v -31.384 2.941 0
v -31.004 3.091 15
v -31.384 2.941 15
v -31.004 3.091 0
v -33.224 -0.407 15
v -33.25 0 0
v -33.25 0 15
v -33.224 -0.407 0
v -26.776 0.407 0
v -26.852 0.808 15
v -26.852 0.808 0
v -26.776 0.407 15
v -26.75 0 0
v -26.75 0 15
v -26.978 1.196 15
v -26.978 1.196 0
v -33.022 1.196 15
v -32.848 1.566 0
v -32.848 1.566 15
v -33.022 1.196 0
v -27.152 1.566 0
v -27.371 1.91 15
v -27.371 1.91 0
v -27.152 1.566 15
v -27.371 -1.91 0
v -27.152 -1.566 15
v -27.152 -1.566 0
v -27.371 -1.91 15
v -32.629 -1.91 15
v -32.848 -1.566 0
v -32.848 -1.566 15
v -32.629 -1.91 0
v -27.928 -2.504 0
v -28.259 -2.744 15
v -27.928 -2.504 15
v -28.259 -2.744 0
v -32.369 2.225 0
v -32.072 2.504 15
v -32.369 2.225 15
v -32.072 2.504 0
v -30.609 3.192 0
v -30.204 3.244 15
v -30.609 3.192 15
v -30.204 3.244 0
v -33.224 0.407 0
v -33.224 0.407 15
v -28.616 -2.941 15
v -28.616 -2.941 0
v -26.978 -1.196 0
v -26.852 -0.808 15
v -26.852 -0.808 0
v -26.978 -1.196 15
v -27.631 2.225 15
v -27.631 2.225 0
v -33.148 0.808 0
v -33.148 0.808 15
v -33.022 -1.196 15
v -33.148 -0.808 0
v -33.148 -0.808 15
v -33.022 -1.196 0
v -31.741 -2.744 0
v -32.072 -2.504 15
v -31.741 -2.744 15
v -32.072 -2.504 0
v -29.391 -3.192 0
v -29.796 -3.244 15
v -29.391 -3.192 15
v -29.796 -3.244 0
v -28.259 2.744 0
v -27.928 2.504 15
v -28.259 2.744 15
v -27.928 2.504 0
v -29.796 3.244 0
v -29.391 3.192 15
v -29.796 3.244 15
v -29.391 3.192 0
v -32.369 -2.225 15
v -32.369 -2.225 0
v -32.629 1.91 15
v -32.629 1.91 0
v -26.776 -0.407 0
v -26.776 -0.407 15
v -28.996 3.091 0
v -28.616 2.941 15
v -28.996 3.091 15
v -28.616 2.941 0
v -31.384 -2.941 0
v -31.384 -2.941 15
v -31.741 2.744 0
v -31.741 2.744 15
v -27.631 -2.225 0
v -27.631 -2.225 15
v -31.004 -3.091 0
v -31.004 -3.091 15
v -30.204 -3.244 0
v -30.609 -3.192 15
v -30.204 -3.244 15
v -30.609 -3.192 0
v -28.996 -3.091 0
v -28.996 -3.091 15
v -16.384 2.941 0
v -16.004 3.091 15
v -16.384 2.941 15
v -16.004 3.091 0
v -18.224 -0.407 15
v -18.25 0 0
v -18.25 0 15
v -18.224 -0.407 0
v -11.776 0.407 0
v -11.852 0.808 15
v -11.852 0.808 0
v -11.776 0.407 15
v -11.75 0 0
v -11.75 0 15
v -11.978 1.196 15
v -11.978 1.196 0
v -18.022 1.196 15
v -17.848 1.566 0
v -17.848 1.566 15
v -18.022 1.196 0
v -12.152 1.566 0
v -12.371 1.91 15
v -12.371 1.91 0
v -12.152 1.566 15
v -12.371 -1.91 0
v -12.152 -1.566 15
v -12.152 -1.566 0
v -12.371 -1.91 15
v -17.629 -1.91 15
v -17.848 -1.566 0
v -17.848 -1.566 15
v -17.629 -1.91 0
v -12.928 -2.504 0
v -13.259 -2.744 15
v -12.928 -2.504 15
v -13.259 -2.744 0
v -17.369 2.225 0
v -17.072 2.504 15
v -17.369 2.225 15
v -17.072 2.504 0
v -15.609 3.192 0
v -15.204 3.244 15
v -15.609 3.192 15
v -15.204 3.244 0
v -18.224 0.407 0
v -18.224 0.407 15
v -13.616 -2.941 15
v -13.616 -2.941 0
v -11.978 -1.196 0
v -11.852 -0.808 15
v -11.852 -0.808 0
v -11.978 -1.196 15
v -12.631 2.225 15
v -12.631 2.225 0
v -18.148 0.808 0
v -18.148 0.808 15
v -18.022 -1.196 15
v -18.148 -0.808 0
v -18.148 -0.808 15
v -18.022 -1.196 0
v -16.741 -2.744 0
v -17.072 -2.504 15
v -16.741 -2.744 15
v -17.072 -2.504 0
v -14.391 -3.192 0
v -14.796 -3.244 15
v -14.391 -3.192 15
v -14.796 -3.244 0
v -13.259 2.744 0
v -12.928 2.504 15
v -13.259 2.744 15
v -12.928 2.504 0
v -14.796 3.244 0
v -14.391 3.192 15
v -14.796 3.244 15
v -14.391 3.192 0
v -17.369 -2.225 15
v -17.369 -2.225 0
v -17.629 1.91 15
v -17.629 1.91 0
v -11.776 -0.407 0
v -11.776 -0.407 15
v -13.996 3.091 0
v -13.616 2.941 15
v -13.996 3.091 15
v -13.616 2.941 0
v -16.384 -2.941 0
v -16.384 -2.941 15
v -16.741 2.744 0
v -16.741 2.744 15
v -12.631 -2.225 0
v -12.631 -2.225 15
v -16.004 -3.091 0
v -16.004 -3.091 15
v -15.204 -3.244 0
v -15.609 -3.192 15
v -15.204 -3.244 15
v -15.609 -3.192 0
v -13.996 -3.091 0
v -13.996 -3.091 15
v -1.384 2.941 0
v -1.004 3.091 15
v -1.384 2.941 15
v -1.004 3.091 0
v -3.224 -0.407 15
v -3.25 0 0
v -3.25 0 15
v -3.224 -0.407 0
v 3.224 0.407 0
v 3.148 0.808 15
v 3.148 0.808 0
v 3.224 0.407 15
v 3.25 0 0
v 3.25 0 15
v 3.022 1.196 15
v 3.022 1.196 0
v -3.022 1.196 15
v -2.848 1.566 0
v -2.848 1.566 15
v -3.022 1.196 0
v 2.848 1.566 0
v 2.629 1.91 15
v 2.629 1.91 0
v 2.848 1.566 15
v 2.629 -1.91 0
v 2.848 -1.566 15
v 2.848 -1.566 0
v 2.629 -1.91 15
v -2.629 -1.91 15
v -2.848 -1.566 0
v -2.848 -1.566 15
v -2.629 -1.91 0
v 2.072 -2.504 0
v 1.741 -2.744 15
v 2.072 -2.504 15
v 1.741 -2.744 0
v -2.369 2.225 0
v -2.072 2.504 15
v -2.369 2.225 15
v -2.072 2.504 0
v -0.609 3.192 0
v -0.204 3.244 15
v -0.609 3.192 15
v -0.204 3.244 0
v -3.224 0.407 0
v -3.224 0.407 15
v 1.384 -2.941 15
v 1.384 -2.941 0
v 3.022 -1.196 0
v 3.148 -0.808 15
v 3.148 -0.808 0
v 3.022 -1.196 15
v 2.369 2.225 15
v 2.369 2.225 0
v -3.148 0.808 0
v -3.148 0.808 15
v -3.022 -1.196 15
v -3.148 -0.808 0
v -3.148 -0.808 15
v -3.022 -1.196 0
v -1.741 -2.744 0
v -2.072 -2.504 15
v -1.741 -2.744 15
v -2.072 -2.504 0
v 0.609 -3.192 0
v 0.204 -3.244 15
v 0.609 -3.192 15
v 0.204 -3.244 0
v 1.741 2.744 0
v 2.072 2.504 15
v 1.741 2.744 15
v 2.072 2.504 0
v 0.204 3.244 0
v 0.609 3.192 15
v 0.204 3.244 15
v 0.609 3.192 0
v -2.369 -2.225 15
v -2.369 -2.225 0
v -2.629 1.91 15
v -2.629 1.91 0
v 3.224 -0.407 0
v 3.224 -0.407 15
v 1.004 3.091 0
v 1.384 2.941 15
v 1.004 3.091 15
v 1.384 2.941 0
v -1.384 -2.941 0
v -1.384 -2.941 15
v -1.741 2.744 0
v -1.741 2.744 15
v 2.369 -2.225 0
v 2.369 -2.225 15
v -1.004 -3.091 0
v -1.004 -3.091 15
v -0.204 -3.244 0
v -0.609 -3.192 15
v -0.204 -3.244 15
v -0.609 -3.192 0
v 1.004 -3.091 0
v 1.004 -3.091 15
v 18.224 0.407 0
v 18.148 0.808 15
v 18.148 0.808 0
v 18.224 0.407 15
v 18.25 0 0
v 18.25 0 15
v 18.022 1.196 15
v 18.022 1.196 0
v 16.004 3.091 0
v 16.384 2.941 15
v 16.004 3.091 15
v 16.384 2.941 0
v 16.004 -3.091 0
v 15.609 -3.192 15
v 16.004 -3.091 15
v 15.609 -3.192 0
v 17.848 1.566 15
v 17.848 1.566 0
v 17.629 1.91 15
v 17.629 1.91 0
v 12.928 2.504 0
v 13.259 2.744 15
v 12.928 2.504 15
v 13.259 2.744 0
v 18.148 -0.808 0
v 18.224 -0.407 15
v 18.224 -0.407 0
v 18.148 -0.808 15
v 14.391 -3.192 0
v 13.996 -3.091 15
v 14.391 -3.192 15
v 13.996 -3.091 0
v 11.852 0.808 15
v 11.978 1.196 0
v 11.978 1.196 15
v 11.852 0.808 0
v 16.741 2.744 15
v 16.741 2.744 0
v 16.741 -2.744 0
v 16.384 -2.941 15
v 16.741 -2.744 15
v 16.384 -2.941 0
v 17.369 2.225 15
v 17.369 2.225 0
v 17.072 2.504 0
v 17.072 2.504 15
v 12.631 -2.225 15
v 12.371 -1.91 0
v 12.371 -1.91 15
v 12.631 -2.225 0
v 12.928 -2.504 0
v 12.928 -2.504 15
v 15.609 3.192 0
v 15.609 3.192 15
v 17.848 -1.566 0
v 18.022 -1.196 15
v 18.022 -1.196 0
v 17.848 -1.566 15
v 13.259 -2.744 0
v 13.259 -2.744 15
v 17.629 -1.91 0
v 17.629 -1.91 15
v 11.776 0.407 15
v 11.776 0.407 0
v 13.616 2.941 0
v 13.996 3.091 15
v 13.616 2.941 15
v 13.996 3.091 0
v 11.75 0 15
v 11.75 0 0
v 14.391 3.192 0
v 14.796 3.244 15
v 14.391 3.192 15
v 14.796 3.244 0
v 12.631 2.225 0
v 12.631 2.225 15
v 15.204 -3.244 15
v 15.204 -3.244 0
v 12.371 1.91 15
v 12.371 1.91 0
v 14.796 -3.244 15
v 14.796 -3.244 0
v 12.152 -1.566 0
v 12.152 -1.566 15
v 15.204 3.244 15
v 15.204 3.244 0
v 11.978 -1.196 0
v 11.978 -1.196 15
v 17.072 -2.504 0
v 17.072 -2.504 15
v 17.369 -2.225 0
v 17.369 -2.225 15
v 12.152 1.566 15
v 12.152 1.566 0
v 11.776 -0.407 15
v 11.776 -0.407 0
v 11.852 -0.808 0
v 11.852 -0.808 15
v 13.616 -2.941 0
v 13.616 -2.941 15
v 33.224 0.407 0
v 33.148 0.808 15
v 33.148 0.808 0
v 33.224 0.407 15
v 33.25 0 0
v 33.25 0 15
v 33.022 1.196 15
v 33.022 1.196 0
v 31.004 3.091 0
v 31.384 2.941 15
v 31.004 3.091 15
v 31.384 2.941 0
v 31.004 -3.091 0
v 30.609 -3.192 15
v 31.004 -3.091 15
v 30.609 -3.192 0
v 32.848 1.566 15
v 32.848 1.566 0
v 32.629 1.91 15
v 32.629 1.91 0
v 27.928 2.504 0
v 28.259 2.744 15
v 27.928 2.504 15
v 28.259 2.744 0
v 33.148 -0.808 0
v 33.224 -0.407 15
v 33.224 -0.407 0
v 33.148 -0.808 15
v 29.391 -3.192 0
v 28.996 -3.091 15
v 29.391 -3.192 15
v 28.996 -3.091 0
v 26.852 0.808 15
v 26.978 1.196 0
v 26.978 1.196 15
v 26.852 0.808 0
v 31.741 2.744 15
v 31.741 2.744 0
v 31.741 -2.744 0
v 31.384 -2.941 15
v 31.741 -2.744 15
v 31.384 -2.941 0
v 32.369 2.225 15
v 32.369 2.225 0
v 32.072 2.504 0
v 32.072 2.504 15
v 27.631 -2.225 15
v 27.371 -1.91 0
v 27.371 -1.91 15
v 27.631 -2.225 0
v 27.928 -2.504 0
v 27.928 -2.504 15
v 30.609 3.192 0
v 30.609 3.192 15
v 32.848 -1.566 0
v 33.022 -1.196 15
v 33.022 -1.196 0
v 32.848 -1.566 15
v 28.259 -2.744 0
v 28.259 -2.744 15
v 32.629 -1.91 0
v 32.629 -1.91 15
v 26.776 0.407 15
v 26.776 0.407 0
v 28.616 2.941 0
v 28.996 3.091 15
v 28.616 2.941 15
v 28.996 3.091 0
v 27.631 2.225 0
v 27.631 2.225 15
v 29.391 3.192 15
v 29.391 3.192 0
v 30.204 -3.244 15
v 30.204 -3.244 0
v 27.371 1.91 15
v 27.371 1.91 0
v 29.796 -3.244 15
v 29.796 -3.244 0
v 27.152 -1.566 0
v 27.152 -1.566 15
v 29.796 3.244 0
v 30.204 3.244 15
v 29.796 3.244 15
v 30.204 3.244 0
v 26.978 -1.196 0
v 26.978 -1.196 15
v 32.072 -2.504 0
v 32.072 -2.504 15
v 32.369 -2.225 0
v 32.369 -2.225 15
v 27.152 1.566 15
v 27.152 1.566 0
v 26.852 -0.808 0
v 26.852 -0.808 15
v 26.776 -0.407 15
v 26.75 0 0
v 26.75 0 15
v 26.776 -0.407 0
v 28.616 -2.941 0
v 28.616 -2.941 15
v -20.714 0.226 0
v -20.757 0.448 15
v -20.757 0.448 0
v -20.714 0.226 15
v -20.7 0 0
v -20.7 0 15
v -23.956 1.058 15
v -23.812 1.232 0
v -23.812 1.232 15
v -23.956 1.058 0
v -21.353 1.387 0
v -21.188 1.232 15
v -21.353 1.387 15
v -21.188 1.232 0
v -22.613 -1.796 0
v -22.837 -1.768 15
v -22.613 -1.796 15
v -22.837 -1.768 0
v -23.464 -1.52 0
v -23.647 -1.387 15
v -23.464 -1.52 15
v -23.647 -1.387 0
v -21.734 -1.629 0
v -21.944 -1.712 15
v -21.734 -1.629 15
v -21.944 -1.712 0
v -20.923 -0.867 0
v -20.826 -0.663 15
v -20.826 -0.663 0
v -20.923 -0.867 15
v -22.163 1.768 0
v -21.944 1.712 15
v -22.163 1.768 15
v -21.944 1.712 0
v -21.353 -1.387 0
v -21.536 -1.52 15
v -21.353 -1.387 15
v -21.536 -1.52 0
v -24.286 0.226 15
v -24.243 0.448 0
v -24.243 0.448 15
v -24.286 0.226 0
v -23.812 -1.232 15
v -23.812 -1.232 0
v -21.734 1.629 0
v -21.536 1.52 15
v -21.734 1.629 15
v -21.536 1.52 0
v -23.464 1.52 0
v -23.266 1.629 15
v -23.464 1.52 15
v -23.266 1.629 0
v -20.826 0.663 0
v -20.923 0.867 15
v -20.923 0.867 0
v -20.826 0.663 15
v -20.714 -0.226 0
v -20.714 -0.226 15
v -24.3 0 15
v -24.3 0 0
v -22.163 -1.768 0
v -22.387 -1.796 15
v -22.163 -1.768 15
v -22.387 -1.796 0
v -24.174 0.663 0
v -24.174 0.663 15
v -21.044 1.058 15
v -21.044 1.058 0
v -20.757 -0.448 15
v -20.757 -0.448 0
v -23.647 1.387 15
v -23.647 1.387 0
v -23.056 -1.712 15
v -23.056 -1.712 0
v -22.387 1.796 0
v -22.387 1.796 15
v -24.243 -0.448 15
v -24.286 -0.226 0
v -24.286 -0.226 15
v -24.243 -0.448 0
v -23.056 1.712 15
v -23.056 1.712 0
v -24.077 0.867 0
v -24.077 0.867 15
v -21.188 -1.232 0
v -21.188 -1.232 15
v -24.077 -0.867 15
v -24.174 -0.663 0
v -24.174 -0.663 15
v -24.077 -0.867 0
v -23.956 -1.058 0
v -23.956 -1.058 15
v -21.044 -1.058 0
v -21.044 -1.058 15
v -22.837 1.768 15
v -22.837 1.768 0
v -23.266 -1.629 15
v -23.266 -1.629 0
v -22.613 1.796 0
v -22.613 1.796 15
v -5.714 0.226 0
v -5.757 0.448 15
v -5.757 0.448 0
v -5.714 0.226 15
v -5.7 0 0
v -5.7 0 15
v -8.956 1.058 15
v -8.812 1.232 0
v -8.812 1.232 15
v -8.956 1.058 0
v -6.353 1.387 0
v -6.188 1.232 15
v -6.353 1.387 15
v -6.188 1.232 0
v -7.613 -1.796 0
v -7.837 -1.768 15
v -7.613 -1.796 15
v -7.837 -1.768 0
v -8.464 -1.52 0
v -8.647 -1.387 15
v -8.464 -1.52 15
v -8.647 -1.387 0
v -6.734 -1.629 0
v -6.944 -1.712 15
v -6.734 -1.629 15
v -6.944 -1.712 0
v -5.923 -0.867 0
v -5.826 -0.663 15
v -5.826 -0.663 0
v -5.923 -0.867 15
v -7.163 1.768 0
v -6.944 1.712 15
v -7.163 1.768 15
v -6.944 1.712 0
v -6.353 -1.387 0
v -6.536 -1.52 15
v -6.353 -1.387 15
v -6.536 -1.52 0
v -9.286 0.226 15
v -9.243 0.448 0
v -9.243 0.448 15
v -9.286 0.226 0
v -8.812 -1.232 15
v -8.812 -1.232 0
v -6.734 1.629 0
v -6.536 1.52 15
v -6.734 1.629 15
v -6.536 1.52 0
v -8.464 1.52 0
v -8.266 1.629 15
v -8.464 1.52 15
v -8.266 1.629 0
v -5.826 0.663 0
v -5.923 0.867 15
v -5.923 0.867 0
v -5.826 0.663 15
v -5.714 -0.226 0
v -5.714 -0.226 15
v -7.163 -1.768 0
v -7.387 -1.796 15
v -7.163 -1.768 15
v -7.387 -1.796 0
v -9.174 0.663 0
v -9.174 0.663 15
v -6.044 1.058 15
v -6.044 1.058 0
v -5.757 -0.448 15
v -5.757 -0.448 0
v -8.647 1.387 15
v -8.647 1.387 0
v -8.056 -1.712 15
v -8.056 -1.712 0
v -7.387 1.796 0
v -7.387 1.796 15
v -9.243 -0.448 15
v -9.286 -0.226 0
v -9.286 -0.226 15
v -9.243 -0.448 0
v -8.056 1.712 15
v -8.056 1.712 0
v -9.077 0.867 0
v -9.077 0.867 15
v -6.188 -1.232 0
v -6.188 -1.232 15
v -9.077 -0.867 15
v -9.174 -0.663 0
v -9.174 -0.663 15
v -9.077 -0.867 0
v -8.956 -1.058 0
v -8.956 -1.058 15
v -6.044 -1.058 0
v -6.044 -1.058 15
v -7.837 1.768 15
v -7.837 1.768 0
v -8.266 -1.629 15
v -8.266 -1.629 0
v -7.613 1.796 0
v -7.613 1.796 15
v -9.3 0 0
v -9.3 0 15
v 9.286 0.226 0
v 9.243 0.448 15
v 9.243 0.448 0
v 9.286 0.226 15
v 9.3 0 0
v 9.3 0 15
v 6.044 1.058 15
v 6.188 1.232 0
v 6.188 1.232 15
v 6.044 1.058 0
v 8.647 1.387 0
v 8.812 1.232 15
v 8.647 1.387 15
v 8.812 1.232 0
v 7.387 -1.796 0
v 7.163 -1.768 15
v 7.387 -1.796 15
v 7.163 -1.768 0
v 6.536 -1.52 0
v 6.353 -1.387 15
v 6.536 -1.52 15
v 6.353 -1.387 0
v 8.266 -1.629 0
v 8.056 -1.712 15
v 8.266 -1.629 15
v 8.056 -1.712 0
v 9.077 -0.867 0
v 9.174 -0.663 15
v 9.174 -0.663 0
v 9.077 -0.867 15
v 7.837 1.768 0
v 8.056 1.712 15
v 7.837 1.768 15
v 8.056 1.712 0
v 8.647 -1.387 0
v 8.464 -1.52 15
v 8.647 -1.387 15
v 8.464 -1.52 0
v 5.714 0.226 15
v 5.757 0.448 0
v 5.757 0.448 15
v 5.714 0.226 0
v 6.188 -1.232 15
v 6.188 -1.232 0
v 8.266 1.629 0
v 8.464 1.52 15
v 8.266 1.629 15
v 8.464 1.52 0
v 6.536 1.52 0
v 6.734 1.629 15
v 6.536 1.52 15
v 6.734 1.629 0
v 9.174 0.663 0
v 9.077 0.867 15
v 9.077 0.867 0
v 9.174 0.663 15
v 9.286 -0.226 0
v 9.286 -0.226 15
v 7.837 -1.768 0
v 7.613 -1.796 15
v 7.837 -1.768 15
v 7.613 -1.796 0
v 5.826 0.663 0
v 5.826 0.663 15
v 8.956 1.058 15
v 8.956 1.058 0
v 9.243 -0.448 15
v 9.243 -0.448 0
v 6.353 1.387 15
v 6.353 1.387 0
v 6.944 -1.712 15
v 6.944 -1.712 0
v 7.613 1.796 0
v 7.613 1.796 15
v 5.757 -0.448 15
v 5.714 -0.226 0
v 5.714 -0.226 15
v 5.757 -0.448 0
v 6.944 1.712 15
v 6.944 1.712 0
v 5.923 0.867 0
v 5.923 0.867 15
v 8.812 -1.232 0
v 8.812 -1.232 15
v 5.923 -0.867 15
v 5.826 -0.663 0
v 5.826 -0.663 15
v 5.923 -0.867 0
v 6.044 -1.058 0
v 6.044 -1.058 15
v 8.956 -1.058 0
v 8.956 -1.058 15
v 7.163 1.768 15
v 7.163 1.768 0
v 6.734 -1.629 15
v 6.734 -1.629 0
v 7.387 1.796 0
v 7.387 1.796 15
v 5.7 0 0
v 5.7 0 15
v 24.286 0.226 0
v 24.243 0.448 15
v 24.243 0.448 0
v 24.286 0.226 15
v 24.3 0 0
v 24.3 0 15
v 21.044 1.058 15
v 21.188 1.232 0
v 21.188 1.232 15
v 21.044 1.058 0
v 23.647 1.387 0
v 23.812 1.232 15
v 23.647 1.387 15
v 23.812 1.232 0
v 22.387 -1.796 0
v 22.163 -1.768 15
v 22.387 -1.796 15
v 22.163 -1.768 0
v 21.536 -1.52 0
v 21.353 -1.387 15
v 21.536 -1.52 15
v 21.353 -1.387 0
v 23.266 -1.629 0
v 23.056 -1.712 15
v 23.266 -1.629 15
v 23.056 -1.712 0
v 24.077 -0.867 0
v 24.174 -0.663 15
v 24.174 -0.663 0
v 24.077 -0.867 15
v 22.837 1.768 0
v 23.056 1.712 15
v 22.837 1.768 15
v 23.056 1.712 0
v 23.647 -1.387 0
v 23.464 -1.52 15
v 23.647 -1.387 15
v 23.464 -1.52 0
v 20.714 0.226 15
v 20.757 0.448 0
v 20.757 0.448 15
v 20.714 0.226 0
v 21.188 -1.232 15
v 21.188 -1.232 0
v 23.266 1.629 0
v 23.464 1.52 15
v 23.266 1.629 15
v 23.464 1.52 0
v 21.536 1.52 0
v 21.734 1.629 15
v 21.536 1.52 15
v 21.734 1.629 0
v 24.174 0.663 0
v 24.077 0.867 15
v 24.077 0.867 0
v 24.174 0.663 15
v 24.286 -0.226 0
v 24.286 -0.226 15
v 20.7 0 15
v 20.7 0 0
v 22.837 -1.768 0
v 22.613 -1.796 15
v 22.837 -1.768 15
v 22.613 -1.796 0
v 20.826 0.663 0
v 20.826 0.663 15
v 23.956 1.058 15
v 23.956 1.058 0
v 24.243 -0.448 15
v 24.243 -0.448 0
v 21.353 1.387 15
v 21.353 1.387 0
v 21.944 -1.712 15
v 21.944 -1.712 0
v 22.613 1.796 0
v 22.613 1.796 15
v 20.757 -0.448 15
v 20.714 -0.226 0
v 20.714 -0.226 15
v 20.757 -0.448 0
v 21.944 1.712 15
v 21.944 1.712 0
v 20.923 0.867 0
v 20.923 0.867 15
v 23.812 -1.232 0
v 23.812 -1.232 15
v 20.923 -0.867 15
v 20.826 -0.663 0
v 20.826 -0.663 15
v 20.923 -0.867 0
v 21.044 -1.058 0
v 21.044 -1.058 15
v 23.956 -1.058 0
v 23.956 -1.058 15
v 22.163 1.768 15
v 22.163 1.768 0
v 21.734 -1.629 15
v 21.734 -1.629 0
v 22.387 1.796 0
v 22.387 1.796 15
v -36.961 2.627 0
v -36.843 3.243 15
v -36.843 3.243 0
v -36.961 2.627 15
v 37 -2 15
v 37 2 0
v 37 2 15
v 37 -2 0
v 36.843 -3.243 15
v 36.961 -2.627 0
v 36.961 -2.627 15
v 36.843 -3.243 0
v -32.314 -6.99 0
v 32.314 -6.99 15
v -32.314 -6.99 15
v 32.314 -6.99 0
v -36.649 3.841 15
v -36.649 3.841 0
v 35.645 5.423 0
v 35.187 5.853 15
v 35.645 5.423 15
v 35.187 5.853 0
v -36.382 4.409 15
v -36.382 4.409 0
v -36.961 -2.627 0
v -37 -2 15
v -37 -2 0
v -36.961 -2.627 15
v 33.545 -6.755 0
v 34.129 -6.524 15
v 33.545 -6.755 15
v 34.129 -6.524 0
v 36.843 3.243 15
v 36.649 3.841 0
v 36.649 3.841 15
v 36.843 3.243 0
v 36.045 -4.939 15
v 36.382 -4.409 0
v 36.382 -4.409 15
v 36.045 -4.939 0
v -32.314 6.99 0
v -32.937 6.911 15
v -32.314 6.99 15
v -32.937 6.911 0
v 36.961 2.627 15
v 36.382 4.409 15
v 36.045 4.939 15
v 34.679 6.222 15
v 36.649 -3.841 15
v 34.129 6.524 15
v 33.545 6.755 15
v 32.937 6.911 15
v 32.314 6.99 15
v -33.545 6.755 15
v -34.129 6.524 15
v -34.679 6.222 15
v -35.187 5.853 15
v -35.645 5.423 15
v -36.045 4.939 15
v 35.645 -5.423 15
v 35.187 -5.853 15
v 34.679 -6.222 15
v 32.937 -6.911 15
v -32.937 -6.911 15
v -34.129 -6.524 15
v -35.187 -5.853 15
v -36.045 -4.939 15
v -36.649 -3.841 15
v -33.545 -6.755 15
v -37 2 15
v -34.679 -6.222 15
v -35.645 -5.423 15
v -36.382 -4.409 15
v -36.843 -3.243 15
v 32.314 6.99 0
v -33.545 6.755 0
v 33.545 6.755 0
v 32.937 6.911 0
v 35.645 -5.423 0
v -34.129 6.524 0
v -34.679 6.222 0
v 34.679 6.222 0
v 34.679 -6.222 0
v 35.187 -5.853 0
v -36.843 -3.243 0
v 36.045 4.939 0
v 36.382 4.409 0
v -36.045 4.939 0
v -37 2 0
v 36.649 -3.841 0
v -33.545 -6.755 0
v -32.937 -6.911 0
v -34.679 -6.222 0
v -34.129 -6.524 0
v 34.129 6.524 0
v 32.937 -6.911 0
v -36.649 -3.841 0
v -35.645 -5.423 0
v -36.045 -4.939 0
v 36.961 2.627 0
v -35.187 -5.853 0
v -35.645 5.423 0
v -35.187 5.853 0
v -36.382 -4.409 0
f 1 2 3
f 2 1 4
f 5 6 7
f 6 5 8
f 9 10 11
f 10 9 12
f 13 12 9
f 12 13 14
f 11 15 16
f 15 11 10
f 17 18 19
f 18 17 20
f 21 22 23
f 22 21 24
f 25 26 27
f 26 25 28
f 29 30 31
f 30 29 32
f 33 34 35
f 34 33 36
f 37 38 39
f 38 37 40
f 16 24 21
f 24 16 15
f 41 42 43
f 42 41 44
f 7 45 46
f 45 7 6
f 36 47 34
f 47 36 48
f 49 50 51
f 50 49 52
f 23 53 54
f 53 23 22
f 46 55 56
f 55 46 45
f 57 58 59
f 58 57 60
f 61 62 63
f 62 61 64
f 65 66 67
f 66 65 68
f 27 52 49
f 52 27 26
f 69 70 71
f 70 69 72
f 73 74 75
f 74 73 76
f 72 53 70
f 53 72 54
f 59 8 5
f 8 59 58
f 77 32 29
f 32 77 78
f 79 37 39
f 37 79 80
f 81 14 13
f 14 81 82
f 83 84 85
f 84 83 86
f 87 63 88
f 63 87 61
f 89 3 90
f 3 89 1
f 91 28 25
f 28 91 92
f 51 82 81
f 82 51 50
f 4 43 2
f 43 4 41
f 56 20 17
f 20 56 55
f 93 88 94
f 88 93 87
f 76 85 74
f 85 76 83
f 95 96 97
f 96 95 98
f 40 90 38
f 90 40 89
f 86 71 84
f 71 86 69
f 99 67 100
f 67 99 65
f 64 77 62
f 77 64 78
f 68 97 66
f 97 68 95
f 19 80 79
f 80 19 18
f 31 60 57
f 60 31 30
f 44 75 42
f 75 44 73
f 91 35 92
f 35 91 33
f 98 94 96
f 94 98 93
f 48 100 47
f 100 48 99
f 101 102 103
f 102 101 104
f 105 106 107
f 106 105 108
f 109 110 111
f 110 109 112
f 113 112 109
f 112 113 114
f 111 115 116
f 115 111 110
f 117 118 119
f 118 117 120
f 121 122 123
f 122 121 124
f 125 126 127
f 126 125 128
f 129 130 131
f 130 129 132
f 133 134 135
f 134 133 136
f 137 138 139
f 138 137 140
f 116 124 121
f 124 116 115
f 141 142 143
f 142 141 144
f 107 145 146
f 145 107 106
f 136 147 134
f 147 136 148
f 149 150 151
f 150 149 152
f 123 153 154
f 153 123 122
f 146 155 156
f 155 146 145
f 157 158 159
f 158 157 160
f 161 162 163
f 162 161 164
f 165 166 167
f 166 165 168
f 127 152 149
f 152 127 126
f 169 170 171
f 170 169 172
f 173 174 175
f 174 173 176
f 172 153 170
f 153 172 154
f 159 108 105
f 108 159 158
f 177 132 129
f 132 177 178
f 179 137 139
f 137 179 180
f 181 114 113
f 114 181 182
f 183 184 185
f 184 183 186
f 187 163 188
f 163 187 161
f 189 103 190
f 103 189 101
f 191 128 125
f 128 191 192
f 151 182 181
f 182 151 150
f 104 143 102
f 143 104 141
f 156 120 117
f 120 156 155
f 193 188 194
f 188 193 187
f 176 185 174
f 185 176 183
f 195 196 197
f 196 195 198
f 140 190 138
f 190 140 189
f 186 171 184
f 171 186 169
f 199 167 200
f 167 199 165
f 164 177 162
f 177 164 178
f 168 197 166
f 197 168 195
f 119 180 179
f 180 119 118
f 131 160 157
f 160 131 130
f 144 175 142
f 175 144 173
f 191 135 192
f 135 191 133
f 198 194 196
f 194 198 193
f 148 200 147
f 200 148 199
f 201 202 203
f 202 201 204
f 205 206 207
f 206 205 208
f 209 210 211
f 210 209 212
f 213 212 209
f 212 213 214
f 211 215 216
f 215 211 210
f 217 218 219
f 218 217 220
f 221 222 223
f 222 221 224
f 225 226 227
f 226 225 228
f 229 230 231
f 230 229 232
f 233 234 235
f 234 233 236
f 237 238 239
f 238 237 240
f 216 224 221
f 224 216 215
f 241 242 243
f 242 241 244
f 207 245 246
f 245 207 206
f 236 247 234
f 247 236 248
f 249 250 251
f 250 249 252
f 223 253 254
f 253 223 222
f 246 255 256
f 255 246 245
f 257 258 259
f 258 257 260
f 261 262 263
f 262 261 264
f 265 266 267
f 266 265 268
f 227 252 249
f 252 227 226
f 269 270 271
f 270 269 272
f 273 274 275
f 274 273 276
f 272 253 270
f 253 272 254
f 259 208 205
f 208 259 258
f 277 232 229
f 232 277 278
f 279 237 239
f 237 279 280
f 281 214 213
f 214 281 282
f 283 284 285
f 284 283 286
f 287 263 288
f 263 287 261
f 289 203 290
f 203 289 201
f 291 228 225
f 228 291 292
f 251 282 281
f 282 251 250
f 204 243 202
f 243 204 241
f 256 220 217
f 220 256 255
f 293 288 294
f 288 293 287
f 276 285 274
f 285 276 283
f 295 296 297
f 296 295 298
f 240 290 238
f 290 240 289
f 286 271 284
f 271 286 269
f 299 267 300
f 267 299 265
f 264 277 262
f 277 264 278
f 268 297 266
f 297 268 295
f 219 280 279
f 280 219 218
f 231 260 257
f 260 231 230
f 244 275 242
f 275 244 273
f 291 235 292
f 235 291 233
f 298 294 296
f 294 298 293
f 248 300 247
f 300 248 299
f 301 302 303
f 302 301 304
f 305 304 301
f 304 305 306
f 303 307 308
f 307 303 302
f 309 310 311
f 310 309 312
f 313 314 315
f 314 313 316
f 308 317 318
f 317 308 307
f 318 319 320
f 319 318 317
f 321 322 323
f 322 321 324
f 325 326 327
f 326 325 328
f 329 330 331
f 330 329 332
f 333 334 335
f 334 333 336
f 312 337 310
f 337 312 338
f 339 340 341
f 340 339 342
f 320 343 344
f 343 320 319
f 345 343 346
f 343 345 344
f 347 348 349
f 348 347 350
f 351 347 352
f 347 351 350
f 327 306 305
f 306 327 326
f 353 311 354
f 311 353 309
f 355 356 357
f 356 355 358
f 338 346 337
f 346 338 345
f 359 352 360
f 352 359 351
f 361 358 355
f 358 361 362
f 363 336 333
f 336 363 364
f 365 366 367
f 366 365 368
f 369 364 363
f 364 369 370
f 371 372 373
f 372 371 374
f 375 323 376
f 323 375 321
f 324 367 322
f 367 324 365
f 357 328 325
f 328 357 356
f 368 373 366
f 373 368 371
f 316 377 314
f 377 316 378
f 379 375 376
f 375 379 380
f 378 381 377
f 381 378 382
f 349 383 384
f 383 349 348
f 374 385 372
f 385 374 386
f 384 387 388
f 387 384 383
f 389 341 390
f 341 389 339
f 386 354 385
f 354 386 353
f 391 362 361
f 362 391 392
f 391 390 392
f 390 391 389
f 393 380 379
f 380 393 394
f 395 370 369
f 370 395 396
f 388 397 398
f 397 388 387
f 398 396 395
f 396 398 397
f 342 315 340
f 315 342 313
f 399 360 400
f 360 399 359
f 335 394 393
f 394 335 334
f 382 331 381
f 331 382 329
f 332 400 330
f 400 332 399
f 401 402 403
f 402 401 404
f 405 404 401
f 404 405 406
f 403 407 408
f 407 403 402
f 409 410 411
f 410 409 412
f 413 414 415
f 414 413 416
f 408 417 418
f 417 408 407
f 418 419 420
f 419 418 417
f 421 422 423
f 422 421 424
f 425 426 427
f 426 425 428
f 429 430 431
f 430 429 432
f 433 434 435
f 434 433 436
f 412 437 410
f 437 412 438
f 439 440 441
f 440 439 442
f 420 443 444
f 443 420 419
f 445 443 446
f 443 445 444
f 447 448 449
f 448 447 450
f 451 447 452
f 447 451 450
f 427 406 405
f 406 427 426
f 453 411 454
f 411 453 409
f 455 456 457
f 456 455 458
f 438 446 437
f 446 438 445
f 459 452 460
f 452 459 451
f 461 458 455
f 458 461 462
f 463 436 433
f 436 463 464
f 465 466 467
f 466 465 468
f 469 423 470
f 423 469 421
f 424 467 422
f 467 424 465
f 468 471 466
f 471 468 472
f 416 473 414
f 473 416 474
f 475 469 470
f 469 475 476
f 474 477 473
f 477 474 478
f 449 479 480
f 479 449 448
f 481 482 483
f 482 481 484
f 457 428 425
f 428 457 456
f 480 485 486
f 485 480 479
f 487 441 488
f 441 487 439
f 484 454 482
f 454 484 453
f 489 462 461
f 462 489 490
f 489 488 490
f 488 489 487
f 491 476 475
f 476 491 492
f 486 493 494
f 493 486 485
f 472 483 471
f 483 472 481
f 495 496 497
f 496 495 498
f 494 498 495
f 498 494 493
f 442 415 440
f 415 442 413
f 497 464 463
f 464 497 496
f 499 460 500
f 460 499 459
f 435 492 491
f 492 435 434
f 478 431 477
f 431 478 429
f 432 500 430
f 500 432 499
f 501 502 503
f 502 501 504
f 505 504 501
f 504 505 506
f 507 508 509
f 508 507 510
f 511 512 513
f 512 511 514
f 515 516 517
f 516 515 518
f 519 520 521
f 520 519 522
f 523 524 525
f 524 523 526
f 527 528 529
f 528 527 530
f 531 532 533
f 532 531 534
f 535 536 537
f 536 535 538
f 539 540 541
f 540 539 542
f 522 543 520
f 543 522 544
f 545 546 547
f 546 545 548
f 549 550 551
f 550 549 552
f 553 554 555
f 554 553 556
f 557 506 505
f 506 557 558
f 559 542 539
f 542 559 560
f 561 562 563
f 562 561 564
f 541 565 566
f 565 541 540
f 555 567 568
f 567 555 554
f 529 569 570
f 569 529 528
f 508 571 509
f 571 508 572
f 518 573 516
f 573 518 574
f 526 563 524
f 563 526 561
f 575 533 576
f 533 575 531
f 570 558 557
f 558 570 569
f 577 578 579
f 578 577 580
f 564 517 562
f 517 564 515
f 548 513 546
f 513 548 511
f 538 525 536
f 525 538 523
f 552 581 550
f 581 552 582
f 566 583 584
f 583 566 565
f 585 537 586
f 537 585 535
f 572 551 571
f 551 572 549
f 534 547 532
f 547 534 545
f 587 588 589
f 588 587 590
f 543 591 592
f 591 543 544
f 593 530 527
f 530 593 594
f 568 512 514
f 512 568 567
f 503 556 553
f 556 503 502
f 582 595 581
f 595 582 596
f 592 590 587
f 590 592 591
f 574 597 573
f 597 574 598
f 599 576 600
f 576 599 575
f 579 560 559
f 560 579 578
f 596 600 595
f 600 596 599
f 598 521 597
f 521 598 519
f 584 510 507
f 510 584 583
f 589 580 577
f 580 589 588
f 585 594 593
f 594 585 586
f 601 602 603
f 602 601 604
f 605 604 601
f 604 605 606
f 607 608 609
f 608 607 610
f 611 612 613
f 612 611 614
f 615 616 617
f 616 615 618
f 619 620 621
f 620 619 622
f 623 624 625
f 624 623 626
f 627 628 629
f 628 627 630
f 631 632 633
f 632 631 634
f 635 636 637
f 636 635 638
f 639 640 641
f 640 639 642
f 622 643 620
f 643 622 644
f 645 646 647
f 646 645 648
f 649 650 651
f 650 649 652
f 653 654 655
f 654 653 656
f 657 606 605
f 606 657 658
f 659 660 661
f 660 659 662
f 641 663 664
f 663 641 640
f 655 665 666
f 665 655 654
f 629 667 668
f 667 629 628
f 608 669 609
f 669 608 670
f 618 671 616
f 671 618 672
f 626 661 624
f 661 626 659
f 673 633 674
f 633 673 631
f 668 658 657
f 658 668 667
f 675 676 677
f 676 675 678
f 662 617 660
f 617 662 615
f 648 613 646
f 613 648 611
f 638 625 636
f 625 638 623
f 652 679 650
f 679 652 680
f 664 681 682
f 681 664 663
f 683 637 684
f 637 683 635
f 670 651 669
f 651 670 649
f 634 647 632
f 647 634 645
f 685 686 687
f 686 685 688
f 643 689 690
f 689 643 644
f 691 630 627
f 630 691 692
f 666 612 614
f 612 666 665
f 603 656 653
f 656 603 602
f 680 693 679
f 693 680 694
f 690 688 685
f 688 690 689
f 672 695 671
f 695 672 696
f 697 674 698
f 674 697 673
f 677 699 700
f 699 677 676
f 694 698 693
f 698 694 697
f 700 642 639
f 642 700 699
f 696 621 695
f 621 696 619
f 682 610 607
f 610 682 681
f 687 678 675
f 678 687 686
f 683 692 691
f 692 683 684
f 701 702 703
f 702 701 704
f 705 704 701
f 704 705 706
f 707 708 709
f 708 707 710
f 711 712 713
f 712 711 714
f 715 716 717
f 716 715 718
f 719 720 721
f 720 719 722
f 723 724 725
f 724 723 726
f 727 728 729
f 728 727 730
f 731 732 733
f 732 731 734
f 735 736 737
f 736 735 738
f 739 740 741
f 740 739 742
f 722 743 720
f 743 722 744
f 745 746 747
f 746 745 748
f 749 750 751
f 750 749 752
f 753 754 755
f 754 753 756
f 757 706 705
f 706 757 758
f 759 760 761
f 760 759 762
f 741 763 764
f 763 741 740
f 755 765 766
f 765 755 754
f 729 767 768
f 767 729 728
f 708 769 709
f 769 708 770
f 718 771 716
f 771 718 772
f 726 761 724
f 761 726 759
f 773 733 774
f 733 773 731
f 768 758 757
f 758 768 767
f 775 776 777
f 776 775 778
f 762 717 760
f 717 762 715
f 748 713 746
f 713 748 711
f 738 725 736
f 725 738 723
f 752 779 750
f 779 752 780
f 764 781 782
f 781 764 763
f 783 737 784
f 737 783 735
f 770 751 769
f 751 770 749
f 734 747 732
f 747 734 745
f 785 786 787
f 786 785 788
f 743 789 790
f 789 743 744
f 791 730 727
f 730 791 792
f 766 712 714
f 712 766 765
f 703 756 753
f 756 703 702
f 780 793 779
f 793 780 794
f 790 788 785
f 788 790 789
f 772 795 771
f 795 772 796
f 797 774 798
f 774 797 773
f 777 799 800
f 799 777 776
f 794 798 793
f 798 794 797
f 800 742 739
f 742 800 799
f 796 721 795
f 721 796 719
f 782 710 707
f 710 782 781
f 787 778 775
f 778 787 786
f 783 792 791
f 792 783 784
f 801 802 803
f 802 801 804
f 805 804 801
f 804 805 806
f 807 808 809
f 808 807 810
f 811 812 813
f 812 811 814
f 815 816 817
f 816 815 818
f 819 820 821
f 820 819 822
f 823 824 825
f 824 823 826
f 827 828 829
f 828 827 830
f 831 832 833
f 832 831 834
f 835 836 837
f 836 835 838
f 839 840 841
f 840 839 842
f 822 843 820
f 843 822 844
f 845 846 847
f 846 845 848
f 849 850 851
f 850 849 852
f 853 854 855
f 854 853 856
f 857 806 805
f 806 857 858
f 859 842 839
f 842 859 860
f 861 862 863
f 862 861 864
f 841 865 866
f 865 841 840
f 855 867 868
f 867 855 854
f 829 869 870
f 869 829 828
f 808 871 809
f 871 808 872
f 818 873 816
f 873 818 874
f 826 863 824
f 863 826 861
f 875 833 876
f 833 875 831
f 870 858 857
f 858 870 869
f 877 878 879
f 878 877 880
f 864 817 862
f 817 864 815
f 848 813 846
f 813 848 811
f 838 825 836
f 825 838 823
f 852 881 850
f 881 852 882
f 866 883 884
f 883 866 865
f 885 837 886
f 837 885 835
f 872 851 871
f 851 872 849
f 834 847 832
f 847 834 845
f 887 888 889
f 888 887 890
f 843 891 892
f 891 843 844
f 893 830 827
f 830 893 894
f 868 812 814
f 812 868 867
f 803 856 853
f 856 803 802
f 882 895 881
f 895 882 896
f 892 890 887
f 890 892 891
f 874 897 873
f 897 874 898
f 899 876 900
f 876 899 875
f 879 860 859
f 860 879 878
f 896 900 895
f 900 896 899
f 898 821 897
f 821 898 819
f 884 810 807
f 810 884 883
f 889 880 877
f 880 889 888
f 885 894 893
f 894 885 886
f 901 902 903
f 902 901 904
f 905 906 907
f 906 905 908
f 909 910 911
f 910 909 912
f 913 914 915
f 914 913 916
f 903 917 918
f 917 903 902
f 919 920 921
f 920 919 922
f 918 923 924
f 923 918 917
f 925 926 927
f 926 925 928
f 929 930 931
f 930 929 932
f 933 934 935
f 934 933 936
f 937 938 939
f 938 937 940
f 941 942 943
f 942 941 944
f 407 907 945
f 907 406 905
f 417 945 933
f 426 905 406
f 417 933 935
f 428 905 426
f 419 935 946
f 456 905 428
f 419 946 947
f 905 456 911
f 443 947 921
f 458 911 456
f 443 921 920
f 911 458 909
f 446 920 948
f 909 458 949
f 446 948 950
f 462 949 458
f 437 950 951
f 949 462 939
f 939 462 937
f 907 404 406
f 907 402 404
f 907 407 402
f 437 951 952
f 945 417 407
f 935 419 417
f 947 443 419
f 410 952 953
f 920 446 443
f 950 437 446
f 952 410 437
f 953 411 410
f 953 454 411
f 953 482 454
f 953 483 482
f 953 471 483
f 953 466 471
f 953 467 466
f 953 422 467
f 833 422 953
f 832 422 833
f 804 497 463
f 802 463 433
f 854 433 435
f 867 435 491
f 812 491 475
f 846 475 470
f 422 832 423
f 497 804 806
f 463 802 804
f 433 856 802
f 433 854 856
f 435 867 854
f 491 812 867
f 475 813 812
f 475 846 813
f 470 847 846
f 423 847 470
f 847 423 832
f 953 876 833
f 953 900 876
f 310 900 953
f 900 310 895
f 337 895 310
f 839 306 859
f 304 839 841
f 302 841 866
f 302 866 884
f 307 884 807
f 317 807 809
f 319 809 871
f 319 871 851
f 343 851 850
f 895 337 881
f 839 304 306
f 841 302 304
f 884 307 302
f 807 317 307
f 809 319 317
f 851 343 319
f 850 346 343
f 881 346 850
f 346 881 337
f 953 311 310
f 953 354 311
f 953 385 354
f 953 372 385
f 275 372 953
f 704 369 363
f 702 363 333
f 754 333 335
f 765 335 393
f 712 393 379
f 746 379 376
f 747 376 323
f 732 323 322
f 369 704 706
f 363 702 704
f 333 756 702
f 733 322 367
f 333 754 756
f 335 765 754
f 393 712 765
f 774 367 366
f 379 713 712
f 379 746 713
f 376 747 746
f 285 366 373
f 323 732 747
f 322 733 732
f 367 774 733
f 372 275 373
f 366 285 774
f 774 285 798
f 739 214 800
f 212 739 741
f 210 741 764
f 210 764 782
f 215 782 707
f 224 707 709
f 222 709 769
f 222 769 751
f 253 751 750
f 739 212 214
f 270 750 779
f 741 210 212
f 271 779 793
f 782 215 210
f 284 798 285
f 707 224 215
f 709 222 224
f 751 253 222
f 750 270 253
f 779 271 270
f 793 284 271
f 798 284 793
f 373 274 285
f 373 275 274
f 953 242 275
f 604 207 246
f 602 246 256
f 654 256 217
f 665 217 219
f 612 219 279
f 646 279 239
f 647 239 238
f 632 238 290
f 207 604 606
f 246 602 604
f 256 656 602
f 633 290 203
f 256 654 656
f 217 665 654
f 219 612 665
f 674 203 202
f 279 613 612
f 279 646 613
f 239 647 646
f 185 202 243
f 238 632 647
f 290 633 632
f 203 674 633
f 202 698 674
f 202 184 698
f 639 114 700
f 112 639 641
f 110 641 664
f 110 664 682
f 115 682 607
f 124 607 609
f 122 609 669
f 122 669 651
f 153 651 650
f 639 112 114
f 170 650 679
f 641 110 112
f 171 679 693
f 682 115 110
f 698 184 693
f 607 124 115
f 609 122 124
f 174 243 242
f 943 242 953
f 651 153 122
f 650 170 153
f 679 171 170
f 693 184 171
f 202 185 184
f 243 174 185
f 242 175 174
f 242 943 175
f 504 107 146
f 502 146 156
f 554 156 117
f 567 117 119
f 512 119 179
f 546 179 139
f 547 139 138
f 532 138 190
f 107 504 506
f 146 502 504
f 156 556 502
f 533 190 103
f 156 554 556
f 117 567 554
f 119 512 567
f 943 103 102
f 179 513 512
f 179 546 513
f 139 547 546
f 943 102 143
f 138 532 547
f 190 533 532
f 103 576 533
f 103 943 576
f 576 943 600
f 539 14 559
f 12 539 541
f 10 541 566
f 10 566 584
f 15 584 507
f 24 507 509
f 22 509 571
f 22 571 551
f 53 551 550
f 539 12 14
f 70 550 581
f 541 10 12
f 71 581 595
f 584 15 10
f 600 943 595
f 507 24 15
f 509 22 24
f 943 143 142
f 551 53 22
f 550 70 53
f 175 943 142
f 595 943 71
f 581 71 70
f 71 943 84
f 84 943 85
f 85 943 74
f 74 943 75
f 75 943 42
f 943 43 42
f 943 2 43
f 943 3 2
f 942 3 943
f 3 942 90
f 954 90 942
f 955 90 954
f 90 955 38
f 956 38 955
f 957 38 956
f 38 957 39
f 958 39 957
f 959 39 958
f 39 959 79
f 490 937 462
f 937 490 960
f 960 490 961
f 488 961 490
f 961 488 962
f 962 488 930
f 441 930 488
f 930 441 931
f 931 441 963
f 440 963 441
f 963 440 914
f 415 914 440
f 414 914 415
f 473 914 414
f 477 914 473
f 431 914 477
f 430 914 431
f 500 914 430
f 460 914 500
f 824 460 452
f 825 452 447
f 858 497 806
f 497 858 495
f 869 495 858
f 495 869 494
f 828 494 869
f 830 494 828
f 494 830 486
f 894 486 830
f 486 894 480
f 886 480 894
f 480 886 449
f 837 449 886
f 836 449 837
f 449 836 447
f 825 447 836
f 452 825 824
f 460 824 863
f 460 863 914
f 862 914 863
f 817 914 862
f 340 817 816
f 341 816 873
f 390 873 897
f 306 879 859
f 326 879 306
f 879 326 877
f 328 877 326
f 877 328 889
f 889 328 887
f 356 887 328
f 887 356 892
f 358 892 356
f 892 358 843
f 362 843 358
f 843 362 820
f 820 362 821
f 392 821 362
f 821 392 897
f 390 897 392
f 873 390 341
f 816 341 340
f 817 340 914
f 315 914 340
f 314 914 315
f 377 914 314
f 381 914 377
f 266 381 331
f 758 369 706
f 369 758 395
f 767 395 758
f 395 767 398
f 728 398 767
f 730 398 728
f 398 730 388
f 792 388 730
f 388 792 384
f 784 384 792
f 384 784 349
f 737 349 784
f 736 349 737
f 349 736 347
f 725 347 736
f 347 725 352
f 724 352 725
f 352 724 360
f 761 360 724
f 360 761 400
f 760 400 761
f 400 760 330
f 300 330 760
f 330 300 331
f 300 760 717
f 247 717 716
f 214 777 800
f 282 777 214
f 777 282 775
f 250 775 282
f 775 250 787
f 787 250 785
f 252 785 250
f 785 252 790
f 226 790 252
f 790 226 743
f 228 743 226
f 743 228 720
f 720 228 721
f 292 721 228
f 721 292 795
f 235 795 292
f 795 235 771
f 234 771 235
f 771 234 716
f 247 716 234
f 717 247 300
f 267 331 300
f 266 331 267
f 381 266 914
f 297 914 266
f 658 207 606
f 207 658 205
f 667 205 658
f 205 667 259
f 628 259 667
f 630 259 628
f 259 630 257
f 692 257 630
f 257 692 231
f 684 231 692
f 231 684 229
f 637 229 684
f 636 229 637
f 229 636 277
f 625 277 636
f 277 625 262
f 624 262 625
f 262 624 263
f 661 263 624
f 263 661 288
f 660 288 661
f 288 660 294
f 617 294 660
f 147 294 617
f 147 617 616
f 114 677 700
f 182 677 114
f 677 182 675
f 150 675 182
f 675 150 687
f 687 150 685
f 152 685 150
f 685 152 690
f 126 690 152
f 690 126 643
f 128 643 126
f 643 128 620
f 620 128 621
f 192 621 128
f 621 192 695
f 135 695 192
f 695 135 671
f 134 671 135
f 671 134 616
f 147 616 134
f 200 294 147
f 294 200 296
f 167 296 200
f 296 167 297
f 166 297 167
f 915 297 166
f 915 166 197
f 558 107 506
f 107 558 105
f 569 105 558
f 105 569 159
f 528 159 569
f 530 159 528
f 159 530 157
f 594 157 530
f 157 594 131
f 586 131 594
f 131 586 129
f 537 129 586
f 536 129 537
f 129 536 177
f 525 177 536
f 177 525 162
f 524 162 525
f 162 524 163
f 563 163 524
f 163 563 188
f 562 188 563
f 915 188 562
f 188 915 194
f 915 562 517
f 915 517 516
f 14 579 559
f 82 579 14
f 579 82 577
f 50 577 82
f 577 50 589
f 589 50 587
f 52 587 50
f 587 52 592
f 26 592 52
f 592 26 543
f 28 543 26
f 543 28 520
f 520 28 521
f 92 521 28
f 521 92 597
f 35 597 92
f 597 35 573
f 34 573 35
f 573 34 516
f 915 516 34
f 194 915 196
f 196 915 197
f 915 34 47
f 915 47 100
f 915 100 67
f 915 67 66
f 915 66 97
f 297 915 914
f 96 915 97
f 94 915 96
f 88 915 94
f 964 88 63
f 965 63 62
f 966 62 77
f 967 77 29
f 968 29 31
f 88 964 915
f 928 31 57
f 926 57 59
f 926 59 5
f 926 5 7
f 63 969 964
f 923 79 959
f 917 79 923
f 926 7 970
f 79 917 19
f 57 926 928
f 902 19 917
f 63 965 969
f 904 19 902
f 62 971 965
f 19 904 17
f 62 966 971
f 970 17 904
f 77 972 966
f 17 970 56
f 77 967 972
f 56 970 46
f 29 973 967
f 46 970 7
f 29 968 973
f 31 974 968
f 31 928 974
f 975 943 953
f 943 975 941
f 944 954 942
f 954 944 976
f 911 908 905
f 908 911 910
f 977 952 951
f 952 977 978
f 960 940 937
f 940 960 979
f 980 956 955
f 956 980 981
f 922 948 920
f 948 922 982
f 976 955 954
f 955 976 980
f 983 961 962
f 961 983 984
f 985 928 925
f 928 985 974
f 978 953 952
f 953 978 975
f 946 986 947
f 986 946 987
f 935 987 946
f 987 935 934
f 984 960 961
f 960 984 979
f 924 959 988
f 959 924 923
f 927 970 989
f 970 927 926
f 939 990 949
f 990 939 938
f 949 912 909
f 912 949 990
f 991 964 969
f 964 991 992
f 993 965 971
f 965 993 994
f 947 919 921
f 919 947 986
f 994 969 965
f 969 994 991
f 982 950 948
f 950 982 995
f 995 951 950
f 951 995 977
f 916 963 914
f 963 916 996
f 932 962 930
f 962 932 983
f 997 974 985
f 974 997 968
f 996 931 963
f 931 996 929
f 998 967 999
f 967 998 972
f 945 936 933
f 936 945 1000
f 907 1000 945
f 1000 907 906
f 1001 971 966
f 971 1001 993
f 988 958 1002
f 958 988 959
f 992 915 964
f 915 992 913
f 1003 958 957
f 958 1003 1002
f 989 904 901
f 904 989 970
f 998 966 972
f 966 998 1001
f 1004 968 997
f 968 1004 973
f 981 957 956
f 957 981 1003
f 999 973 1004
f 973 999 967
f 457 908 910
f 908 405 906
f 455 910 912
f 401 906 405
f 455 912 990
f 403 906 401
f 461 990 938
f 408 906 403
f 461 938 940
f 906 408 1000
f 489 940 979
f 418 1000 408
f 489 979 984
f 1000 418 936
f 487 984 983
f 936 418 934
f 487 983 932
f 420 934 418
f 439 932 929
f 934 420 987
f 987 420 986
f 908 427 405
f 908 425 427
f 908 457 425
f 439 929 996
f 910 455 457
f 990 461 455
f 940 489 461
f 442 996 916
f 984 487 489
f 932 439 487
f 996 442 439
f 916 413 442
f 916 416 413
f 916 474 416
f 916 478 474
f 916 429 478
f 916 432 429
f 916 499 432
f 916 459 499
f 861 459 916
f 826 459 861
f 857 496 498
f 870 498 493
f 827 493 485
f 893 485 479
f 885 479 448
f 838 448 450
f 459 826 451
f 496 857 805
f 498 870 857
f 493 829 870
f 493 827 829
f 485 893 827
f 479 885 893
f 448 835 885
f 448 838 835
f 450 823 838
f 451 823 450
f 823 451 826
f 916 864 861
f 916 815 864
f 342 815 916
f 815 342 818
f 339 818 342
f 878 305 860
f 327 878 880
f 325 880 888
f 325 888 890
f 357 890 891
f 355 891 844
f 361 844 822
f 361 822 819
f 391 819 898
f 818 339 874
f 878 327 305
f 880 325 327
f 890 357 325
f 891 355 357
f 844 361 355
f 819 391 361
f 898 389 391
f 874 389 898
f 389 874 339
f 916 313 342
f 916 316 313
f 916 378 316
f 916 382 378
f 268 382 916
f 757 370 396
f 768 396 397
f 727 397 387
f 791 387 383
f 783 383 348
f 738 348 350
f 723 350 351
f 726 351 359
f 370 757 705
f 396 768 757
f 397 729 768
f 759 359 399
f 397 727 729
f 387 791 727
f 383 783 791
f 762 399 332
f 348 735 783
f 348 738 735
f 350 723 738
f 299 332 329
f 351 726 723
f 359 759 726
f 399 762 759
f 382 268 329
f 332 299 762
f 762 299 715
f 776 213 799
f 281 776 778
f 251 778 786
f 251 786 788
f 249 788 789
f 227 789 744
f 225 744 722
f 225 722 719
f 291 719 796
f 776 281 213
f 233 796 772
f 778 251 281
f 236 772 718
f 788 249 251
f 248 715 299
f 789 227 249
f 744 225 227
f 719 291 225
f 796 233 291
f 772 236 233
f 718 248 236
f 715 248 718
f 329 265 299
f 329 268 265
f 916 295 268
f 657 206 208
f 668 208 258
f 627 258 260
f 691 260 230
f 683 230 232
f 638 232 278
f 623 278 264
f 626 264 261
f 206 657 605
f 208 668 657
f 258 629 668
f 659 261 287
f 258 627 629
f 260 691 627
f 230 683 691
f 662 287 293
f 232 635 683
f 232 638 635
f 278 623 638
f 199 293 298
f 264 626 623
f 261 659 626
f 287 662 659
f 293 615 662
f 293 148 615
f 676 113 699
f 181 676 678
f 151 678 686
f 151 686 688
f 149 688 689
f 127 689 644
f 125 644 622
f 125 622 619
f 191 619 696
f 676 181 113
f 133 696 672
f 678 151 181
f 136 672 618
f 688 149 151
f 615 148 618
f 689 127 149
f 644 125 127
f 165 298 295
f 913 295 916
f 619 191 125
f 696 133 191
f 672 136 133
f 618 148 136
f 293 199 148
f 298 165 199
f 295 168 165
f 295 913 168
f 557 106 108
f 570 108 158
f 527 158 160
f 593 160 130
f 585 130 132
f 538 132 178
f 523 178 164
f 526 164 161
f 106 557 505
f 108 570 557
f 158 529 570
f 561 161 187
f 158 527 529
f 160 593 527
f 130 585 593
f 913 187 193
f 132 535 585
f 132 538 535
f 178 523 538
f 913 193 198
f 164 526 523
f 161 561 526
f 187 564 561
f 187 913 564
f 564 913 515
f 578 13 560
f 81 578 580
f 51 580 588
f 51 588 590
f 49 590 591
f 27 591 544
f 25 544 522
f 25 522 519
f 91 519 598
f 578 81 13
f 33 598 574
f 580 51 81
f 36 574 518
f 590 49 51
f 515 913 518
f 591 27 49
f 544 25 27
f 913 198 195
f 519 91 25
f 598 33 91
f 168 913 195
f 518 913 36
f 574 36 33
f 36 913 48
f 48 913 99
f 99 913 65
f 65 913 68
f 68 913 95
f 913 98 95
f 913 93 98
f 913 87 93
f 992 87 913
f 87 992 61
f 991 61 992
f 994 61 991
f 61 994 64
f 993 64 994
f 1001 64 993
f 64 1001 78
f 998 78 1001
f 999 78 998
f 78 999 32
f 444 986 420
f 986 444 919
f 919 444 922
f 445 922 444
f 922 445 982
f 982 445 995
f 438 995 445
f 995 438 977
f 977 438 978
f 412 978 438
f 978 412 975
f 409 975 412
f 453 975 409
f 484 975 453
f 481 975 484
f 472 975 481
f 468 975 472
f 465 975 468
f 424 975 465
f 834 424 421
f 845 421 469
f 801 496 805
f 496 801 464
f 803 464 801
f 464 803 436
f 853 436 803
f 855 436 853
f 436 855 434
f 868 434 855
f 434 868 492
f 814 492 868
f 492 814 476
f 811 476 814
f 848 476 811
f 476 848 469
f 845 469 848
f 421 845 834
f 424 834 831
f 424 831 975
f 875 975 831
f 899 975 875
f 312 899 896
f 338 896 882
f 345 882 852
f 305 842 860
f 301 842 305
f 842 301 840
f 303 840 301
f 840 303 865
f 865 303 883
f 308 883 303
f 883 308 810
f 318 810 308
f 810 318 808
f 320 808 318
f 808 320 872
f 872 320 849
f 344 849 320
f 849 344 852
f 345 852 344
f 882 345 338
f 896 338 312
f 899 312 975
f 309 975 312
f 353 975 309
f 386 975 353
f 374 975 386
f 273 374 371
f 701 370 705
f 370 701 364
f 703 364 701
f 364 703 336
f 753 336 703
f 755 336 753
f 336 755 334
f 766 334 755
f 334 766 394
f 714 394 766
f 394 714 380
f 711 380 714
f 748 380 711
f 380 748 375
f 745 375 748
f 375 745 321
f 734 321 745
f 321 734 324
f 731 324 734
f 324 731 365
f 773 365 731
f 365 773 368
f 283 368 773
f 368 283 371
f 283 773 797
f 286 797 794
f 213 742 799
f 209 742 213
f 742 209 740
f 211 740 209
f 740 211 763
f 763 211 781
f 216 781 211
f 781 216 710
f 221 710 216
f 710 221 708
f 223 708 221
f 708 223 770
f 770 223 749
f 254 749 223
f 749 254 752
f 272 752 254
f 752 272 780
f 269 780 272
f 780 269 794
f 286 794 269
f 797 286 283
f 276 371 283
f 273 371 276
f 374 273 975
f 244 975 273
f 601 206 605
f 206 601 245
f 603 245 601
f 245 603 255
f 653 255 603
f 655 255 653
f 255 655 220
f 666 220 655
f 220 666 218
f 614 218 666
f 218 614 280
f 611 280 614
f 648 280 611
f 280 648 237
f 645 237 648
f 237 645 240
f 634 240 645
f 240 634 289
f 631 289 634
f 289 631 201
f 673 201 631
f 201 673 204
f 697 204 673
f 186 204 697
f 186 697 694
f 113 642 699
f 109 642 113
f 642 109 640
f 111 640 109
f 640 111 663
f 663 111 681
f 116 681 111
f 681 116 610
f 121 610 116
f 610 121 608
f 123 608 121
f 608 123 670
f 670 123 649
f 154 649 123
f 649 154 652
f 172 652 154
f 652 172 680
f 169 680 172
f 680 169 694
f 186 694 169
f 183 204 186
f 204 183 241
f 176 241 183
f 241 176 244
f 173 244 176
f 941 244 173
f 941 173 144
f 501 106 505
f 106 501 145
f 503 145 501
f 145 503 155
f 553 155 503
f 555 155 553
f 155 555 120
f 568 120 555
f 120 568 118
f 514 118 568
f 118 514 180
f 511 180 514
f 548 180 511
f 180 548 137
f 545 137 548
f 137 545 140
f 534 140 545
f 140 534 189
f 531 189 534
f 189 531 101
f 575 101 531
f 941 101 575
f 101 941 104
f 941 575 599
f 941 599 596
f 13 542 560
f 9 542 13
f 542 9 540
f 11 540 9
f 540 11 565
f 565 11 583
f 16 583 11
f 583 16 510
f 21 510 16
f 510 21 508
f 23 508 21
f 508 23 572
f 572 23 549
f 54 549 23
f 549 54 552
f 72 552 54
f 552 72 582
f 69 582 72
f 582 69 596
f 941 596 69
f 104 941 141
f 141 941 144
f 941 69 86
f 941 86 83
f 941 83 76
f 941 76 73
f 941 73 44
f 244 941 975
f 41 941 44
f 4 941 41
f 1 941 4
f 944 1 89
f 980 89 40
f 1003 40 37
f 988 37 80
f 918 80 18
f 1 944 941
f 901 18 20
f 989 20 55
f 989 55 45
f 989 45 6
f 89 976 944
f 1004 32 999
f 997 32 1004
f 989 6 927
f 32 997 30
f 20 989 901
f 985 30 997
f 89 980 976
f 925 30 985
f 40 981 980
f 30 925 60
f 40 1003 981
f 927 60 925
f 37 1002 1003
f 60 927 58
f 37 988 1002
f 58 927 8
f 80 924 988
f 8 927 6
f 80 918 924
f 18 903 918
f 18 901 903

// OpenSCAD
$fn = 50;


difference() {
	union() {
		*color(alpha = 1.0000000000, c = "gray") {
			translate(v = [0, 7, 0]) {
				linear_extrude(height = 1) {
					text(font = "Arial:style=Bold", halign = "center", size = 4.5000000000, text = "COMMENT plate main", valign = "center");
				}
			}
		}
		*color(alpha = 1.0000000000, c = "gray") {
			translate(v = [0, 14, 0]) {
				linear_extrude(height = 1) {
					text(font = "Arial:style=Bold", halign = "center", size = 4.5000000000, text = "COMMENT description oobb_plate_shape_p_type_15_depth_5_width_1_height_15_thickness_true_both_holes", valign = "center");
				}
			}
		}
		hull() {
			translate(v = [-32.0000000000, 2.0000000000, 0]) {
				cylinder(h = 15, r = 5);
			}
			translate(v = [32.0000000000, 2.0000000000, 0]) {
				cylinder(h = 15, r = 5);
			}
			translate(v = [-32.0000000000, -2.0000000000, 0]) {
				cylinder(h = 15, r = 5);
			}
			translate(v = [32.0000000000, -2.0000000000, 0]) {
				cylinder(h = 15, r = 5);
			}
		}
	}
	union() {
		*color(alpha = 1.0000000000, c = "gray") {
			translate(v = [0, 7, 0]) {
				linear_extrude(height = 1) {
					text(font = "Arial:style=Bold", halign = "center", size = 4.5000000000, text = "COMMENT holes main", valign = "center");
				}
			}
		}
		*color(alpha = 1.0000000000, c = "gray") {
			translate(v = [0, 14, 0]) {
				linear_extrude(height = 1) {
					text(font = "Arial:style=Bold", halign = "center", size = 4.5000000000, text = "COMMENT description oobb_holes_shape_n_type_5_width_1_height_15_thickness_true_both_holes", valign = "center");
				}
			}
		}
		translate(v = [-30.0000000000, 0.0000000000, 0]) {
			translate(v = [0, 0, -50]) {
				cylinder(h = 100, r = 3.2500000000);
			}
		}
		translate(v = [-15.0000000000, 0.0000000000, 0]) {
			translate(v = [0, 0, -50]) {
				cylinder(h = 100, r = 3.2500000000);
			}
		}
		translate(v = [0, 0, -50]) {
			cylinder(h = 100, r = 3.2500000000);
		}
		translate(v = [15.0000000000, 0.0000000000, 0]) {
			translate(v = [0, 0, -50]) {
				cylinder(h = 100, r = 3.2500000000);
			}
		}
		translate(v = [30.0000000000, 0.0000000000, 0]) {
			translate(v = [0, 0, -50]) {
				cylinder(h = 100, r = 3.2500000000);
			}
		}
		translate(v = [-30.0000000000, 0.0000000000, 0]) {
			translate(v = [0, 0, -50]) {
				cylinder(h = 100, r = 1.8000000000);
			}
		}
		translate(v = [-22.5000000000, 0.0000000000, 0]) {
			translate(v = [0, 0, -50]) {
				cylinder(h = 100, r = 1.8000000000);
			}
		}
		translate(v = [-15.0000000000, 0.0000000000, 0]) {
			translate(v = [0, 0, -50]) {
				cylinder(h = 100, r = 1.8000000000);
			}
		}
		translate(v = [-7.5000000000, 0.0000000000, 0]) {
			translate(v = [0, 0, -50]) {
				cylinder(h = 100, r = 1.8000000000);
			}
		}
		translate(v = [0, 0, -50]) {
			cylinder(h = 100, r = 1.8000000000);
		}
		translate(v = [7.5000000000, 0.0000000000, 0]) {
			translate(v = [0, 0, -50]) {
				cylinder(h = 100, r = 1.8000000000);
			}
		}
		translate(v = [15.0000000000, 0.0000000000, 0]) {
			translate(v = [0, 0, -50]) {
				cylinder(h = 100, r = 1.8000000000);
			}
		}
		translate(v = [22.5000000000, 0.0000000000, 0]) {
			translate(v = [0, 0, -50]) {
				cylinder(h = 100, r = 1.8000000000);
			}
		}
		translate(v = [30.0000000000, 0.0000000000, 0]) {
			translate(v = [0, 0, -50]) {
				cylinder(h = 100, r = 1.8000000000);
			}
		}
	}
}
